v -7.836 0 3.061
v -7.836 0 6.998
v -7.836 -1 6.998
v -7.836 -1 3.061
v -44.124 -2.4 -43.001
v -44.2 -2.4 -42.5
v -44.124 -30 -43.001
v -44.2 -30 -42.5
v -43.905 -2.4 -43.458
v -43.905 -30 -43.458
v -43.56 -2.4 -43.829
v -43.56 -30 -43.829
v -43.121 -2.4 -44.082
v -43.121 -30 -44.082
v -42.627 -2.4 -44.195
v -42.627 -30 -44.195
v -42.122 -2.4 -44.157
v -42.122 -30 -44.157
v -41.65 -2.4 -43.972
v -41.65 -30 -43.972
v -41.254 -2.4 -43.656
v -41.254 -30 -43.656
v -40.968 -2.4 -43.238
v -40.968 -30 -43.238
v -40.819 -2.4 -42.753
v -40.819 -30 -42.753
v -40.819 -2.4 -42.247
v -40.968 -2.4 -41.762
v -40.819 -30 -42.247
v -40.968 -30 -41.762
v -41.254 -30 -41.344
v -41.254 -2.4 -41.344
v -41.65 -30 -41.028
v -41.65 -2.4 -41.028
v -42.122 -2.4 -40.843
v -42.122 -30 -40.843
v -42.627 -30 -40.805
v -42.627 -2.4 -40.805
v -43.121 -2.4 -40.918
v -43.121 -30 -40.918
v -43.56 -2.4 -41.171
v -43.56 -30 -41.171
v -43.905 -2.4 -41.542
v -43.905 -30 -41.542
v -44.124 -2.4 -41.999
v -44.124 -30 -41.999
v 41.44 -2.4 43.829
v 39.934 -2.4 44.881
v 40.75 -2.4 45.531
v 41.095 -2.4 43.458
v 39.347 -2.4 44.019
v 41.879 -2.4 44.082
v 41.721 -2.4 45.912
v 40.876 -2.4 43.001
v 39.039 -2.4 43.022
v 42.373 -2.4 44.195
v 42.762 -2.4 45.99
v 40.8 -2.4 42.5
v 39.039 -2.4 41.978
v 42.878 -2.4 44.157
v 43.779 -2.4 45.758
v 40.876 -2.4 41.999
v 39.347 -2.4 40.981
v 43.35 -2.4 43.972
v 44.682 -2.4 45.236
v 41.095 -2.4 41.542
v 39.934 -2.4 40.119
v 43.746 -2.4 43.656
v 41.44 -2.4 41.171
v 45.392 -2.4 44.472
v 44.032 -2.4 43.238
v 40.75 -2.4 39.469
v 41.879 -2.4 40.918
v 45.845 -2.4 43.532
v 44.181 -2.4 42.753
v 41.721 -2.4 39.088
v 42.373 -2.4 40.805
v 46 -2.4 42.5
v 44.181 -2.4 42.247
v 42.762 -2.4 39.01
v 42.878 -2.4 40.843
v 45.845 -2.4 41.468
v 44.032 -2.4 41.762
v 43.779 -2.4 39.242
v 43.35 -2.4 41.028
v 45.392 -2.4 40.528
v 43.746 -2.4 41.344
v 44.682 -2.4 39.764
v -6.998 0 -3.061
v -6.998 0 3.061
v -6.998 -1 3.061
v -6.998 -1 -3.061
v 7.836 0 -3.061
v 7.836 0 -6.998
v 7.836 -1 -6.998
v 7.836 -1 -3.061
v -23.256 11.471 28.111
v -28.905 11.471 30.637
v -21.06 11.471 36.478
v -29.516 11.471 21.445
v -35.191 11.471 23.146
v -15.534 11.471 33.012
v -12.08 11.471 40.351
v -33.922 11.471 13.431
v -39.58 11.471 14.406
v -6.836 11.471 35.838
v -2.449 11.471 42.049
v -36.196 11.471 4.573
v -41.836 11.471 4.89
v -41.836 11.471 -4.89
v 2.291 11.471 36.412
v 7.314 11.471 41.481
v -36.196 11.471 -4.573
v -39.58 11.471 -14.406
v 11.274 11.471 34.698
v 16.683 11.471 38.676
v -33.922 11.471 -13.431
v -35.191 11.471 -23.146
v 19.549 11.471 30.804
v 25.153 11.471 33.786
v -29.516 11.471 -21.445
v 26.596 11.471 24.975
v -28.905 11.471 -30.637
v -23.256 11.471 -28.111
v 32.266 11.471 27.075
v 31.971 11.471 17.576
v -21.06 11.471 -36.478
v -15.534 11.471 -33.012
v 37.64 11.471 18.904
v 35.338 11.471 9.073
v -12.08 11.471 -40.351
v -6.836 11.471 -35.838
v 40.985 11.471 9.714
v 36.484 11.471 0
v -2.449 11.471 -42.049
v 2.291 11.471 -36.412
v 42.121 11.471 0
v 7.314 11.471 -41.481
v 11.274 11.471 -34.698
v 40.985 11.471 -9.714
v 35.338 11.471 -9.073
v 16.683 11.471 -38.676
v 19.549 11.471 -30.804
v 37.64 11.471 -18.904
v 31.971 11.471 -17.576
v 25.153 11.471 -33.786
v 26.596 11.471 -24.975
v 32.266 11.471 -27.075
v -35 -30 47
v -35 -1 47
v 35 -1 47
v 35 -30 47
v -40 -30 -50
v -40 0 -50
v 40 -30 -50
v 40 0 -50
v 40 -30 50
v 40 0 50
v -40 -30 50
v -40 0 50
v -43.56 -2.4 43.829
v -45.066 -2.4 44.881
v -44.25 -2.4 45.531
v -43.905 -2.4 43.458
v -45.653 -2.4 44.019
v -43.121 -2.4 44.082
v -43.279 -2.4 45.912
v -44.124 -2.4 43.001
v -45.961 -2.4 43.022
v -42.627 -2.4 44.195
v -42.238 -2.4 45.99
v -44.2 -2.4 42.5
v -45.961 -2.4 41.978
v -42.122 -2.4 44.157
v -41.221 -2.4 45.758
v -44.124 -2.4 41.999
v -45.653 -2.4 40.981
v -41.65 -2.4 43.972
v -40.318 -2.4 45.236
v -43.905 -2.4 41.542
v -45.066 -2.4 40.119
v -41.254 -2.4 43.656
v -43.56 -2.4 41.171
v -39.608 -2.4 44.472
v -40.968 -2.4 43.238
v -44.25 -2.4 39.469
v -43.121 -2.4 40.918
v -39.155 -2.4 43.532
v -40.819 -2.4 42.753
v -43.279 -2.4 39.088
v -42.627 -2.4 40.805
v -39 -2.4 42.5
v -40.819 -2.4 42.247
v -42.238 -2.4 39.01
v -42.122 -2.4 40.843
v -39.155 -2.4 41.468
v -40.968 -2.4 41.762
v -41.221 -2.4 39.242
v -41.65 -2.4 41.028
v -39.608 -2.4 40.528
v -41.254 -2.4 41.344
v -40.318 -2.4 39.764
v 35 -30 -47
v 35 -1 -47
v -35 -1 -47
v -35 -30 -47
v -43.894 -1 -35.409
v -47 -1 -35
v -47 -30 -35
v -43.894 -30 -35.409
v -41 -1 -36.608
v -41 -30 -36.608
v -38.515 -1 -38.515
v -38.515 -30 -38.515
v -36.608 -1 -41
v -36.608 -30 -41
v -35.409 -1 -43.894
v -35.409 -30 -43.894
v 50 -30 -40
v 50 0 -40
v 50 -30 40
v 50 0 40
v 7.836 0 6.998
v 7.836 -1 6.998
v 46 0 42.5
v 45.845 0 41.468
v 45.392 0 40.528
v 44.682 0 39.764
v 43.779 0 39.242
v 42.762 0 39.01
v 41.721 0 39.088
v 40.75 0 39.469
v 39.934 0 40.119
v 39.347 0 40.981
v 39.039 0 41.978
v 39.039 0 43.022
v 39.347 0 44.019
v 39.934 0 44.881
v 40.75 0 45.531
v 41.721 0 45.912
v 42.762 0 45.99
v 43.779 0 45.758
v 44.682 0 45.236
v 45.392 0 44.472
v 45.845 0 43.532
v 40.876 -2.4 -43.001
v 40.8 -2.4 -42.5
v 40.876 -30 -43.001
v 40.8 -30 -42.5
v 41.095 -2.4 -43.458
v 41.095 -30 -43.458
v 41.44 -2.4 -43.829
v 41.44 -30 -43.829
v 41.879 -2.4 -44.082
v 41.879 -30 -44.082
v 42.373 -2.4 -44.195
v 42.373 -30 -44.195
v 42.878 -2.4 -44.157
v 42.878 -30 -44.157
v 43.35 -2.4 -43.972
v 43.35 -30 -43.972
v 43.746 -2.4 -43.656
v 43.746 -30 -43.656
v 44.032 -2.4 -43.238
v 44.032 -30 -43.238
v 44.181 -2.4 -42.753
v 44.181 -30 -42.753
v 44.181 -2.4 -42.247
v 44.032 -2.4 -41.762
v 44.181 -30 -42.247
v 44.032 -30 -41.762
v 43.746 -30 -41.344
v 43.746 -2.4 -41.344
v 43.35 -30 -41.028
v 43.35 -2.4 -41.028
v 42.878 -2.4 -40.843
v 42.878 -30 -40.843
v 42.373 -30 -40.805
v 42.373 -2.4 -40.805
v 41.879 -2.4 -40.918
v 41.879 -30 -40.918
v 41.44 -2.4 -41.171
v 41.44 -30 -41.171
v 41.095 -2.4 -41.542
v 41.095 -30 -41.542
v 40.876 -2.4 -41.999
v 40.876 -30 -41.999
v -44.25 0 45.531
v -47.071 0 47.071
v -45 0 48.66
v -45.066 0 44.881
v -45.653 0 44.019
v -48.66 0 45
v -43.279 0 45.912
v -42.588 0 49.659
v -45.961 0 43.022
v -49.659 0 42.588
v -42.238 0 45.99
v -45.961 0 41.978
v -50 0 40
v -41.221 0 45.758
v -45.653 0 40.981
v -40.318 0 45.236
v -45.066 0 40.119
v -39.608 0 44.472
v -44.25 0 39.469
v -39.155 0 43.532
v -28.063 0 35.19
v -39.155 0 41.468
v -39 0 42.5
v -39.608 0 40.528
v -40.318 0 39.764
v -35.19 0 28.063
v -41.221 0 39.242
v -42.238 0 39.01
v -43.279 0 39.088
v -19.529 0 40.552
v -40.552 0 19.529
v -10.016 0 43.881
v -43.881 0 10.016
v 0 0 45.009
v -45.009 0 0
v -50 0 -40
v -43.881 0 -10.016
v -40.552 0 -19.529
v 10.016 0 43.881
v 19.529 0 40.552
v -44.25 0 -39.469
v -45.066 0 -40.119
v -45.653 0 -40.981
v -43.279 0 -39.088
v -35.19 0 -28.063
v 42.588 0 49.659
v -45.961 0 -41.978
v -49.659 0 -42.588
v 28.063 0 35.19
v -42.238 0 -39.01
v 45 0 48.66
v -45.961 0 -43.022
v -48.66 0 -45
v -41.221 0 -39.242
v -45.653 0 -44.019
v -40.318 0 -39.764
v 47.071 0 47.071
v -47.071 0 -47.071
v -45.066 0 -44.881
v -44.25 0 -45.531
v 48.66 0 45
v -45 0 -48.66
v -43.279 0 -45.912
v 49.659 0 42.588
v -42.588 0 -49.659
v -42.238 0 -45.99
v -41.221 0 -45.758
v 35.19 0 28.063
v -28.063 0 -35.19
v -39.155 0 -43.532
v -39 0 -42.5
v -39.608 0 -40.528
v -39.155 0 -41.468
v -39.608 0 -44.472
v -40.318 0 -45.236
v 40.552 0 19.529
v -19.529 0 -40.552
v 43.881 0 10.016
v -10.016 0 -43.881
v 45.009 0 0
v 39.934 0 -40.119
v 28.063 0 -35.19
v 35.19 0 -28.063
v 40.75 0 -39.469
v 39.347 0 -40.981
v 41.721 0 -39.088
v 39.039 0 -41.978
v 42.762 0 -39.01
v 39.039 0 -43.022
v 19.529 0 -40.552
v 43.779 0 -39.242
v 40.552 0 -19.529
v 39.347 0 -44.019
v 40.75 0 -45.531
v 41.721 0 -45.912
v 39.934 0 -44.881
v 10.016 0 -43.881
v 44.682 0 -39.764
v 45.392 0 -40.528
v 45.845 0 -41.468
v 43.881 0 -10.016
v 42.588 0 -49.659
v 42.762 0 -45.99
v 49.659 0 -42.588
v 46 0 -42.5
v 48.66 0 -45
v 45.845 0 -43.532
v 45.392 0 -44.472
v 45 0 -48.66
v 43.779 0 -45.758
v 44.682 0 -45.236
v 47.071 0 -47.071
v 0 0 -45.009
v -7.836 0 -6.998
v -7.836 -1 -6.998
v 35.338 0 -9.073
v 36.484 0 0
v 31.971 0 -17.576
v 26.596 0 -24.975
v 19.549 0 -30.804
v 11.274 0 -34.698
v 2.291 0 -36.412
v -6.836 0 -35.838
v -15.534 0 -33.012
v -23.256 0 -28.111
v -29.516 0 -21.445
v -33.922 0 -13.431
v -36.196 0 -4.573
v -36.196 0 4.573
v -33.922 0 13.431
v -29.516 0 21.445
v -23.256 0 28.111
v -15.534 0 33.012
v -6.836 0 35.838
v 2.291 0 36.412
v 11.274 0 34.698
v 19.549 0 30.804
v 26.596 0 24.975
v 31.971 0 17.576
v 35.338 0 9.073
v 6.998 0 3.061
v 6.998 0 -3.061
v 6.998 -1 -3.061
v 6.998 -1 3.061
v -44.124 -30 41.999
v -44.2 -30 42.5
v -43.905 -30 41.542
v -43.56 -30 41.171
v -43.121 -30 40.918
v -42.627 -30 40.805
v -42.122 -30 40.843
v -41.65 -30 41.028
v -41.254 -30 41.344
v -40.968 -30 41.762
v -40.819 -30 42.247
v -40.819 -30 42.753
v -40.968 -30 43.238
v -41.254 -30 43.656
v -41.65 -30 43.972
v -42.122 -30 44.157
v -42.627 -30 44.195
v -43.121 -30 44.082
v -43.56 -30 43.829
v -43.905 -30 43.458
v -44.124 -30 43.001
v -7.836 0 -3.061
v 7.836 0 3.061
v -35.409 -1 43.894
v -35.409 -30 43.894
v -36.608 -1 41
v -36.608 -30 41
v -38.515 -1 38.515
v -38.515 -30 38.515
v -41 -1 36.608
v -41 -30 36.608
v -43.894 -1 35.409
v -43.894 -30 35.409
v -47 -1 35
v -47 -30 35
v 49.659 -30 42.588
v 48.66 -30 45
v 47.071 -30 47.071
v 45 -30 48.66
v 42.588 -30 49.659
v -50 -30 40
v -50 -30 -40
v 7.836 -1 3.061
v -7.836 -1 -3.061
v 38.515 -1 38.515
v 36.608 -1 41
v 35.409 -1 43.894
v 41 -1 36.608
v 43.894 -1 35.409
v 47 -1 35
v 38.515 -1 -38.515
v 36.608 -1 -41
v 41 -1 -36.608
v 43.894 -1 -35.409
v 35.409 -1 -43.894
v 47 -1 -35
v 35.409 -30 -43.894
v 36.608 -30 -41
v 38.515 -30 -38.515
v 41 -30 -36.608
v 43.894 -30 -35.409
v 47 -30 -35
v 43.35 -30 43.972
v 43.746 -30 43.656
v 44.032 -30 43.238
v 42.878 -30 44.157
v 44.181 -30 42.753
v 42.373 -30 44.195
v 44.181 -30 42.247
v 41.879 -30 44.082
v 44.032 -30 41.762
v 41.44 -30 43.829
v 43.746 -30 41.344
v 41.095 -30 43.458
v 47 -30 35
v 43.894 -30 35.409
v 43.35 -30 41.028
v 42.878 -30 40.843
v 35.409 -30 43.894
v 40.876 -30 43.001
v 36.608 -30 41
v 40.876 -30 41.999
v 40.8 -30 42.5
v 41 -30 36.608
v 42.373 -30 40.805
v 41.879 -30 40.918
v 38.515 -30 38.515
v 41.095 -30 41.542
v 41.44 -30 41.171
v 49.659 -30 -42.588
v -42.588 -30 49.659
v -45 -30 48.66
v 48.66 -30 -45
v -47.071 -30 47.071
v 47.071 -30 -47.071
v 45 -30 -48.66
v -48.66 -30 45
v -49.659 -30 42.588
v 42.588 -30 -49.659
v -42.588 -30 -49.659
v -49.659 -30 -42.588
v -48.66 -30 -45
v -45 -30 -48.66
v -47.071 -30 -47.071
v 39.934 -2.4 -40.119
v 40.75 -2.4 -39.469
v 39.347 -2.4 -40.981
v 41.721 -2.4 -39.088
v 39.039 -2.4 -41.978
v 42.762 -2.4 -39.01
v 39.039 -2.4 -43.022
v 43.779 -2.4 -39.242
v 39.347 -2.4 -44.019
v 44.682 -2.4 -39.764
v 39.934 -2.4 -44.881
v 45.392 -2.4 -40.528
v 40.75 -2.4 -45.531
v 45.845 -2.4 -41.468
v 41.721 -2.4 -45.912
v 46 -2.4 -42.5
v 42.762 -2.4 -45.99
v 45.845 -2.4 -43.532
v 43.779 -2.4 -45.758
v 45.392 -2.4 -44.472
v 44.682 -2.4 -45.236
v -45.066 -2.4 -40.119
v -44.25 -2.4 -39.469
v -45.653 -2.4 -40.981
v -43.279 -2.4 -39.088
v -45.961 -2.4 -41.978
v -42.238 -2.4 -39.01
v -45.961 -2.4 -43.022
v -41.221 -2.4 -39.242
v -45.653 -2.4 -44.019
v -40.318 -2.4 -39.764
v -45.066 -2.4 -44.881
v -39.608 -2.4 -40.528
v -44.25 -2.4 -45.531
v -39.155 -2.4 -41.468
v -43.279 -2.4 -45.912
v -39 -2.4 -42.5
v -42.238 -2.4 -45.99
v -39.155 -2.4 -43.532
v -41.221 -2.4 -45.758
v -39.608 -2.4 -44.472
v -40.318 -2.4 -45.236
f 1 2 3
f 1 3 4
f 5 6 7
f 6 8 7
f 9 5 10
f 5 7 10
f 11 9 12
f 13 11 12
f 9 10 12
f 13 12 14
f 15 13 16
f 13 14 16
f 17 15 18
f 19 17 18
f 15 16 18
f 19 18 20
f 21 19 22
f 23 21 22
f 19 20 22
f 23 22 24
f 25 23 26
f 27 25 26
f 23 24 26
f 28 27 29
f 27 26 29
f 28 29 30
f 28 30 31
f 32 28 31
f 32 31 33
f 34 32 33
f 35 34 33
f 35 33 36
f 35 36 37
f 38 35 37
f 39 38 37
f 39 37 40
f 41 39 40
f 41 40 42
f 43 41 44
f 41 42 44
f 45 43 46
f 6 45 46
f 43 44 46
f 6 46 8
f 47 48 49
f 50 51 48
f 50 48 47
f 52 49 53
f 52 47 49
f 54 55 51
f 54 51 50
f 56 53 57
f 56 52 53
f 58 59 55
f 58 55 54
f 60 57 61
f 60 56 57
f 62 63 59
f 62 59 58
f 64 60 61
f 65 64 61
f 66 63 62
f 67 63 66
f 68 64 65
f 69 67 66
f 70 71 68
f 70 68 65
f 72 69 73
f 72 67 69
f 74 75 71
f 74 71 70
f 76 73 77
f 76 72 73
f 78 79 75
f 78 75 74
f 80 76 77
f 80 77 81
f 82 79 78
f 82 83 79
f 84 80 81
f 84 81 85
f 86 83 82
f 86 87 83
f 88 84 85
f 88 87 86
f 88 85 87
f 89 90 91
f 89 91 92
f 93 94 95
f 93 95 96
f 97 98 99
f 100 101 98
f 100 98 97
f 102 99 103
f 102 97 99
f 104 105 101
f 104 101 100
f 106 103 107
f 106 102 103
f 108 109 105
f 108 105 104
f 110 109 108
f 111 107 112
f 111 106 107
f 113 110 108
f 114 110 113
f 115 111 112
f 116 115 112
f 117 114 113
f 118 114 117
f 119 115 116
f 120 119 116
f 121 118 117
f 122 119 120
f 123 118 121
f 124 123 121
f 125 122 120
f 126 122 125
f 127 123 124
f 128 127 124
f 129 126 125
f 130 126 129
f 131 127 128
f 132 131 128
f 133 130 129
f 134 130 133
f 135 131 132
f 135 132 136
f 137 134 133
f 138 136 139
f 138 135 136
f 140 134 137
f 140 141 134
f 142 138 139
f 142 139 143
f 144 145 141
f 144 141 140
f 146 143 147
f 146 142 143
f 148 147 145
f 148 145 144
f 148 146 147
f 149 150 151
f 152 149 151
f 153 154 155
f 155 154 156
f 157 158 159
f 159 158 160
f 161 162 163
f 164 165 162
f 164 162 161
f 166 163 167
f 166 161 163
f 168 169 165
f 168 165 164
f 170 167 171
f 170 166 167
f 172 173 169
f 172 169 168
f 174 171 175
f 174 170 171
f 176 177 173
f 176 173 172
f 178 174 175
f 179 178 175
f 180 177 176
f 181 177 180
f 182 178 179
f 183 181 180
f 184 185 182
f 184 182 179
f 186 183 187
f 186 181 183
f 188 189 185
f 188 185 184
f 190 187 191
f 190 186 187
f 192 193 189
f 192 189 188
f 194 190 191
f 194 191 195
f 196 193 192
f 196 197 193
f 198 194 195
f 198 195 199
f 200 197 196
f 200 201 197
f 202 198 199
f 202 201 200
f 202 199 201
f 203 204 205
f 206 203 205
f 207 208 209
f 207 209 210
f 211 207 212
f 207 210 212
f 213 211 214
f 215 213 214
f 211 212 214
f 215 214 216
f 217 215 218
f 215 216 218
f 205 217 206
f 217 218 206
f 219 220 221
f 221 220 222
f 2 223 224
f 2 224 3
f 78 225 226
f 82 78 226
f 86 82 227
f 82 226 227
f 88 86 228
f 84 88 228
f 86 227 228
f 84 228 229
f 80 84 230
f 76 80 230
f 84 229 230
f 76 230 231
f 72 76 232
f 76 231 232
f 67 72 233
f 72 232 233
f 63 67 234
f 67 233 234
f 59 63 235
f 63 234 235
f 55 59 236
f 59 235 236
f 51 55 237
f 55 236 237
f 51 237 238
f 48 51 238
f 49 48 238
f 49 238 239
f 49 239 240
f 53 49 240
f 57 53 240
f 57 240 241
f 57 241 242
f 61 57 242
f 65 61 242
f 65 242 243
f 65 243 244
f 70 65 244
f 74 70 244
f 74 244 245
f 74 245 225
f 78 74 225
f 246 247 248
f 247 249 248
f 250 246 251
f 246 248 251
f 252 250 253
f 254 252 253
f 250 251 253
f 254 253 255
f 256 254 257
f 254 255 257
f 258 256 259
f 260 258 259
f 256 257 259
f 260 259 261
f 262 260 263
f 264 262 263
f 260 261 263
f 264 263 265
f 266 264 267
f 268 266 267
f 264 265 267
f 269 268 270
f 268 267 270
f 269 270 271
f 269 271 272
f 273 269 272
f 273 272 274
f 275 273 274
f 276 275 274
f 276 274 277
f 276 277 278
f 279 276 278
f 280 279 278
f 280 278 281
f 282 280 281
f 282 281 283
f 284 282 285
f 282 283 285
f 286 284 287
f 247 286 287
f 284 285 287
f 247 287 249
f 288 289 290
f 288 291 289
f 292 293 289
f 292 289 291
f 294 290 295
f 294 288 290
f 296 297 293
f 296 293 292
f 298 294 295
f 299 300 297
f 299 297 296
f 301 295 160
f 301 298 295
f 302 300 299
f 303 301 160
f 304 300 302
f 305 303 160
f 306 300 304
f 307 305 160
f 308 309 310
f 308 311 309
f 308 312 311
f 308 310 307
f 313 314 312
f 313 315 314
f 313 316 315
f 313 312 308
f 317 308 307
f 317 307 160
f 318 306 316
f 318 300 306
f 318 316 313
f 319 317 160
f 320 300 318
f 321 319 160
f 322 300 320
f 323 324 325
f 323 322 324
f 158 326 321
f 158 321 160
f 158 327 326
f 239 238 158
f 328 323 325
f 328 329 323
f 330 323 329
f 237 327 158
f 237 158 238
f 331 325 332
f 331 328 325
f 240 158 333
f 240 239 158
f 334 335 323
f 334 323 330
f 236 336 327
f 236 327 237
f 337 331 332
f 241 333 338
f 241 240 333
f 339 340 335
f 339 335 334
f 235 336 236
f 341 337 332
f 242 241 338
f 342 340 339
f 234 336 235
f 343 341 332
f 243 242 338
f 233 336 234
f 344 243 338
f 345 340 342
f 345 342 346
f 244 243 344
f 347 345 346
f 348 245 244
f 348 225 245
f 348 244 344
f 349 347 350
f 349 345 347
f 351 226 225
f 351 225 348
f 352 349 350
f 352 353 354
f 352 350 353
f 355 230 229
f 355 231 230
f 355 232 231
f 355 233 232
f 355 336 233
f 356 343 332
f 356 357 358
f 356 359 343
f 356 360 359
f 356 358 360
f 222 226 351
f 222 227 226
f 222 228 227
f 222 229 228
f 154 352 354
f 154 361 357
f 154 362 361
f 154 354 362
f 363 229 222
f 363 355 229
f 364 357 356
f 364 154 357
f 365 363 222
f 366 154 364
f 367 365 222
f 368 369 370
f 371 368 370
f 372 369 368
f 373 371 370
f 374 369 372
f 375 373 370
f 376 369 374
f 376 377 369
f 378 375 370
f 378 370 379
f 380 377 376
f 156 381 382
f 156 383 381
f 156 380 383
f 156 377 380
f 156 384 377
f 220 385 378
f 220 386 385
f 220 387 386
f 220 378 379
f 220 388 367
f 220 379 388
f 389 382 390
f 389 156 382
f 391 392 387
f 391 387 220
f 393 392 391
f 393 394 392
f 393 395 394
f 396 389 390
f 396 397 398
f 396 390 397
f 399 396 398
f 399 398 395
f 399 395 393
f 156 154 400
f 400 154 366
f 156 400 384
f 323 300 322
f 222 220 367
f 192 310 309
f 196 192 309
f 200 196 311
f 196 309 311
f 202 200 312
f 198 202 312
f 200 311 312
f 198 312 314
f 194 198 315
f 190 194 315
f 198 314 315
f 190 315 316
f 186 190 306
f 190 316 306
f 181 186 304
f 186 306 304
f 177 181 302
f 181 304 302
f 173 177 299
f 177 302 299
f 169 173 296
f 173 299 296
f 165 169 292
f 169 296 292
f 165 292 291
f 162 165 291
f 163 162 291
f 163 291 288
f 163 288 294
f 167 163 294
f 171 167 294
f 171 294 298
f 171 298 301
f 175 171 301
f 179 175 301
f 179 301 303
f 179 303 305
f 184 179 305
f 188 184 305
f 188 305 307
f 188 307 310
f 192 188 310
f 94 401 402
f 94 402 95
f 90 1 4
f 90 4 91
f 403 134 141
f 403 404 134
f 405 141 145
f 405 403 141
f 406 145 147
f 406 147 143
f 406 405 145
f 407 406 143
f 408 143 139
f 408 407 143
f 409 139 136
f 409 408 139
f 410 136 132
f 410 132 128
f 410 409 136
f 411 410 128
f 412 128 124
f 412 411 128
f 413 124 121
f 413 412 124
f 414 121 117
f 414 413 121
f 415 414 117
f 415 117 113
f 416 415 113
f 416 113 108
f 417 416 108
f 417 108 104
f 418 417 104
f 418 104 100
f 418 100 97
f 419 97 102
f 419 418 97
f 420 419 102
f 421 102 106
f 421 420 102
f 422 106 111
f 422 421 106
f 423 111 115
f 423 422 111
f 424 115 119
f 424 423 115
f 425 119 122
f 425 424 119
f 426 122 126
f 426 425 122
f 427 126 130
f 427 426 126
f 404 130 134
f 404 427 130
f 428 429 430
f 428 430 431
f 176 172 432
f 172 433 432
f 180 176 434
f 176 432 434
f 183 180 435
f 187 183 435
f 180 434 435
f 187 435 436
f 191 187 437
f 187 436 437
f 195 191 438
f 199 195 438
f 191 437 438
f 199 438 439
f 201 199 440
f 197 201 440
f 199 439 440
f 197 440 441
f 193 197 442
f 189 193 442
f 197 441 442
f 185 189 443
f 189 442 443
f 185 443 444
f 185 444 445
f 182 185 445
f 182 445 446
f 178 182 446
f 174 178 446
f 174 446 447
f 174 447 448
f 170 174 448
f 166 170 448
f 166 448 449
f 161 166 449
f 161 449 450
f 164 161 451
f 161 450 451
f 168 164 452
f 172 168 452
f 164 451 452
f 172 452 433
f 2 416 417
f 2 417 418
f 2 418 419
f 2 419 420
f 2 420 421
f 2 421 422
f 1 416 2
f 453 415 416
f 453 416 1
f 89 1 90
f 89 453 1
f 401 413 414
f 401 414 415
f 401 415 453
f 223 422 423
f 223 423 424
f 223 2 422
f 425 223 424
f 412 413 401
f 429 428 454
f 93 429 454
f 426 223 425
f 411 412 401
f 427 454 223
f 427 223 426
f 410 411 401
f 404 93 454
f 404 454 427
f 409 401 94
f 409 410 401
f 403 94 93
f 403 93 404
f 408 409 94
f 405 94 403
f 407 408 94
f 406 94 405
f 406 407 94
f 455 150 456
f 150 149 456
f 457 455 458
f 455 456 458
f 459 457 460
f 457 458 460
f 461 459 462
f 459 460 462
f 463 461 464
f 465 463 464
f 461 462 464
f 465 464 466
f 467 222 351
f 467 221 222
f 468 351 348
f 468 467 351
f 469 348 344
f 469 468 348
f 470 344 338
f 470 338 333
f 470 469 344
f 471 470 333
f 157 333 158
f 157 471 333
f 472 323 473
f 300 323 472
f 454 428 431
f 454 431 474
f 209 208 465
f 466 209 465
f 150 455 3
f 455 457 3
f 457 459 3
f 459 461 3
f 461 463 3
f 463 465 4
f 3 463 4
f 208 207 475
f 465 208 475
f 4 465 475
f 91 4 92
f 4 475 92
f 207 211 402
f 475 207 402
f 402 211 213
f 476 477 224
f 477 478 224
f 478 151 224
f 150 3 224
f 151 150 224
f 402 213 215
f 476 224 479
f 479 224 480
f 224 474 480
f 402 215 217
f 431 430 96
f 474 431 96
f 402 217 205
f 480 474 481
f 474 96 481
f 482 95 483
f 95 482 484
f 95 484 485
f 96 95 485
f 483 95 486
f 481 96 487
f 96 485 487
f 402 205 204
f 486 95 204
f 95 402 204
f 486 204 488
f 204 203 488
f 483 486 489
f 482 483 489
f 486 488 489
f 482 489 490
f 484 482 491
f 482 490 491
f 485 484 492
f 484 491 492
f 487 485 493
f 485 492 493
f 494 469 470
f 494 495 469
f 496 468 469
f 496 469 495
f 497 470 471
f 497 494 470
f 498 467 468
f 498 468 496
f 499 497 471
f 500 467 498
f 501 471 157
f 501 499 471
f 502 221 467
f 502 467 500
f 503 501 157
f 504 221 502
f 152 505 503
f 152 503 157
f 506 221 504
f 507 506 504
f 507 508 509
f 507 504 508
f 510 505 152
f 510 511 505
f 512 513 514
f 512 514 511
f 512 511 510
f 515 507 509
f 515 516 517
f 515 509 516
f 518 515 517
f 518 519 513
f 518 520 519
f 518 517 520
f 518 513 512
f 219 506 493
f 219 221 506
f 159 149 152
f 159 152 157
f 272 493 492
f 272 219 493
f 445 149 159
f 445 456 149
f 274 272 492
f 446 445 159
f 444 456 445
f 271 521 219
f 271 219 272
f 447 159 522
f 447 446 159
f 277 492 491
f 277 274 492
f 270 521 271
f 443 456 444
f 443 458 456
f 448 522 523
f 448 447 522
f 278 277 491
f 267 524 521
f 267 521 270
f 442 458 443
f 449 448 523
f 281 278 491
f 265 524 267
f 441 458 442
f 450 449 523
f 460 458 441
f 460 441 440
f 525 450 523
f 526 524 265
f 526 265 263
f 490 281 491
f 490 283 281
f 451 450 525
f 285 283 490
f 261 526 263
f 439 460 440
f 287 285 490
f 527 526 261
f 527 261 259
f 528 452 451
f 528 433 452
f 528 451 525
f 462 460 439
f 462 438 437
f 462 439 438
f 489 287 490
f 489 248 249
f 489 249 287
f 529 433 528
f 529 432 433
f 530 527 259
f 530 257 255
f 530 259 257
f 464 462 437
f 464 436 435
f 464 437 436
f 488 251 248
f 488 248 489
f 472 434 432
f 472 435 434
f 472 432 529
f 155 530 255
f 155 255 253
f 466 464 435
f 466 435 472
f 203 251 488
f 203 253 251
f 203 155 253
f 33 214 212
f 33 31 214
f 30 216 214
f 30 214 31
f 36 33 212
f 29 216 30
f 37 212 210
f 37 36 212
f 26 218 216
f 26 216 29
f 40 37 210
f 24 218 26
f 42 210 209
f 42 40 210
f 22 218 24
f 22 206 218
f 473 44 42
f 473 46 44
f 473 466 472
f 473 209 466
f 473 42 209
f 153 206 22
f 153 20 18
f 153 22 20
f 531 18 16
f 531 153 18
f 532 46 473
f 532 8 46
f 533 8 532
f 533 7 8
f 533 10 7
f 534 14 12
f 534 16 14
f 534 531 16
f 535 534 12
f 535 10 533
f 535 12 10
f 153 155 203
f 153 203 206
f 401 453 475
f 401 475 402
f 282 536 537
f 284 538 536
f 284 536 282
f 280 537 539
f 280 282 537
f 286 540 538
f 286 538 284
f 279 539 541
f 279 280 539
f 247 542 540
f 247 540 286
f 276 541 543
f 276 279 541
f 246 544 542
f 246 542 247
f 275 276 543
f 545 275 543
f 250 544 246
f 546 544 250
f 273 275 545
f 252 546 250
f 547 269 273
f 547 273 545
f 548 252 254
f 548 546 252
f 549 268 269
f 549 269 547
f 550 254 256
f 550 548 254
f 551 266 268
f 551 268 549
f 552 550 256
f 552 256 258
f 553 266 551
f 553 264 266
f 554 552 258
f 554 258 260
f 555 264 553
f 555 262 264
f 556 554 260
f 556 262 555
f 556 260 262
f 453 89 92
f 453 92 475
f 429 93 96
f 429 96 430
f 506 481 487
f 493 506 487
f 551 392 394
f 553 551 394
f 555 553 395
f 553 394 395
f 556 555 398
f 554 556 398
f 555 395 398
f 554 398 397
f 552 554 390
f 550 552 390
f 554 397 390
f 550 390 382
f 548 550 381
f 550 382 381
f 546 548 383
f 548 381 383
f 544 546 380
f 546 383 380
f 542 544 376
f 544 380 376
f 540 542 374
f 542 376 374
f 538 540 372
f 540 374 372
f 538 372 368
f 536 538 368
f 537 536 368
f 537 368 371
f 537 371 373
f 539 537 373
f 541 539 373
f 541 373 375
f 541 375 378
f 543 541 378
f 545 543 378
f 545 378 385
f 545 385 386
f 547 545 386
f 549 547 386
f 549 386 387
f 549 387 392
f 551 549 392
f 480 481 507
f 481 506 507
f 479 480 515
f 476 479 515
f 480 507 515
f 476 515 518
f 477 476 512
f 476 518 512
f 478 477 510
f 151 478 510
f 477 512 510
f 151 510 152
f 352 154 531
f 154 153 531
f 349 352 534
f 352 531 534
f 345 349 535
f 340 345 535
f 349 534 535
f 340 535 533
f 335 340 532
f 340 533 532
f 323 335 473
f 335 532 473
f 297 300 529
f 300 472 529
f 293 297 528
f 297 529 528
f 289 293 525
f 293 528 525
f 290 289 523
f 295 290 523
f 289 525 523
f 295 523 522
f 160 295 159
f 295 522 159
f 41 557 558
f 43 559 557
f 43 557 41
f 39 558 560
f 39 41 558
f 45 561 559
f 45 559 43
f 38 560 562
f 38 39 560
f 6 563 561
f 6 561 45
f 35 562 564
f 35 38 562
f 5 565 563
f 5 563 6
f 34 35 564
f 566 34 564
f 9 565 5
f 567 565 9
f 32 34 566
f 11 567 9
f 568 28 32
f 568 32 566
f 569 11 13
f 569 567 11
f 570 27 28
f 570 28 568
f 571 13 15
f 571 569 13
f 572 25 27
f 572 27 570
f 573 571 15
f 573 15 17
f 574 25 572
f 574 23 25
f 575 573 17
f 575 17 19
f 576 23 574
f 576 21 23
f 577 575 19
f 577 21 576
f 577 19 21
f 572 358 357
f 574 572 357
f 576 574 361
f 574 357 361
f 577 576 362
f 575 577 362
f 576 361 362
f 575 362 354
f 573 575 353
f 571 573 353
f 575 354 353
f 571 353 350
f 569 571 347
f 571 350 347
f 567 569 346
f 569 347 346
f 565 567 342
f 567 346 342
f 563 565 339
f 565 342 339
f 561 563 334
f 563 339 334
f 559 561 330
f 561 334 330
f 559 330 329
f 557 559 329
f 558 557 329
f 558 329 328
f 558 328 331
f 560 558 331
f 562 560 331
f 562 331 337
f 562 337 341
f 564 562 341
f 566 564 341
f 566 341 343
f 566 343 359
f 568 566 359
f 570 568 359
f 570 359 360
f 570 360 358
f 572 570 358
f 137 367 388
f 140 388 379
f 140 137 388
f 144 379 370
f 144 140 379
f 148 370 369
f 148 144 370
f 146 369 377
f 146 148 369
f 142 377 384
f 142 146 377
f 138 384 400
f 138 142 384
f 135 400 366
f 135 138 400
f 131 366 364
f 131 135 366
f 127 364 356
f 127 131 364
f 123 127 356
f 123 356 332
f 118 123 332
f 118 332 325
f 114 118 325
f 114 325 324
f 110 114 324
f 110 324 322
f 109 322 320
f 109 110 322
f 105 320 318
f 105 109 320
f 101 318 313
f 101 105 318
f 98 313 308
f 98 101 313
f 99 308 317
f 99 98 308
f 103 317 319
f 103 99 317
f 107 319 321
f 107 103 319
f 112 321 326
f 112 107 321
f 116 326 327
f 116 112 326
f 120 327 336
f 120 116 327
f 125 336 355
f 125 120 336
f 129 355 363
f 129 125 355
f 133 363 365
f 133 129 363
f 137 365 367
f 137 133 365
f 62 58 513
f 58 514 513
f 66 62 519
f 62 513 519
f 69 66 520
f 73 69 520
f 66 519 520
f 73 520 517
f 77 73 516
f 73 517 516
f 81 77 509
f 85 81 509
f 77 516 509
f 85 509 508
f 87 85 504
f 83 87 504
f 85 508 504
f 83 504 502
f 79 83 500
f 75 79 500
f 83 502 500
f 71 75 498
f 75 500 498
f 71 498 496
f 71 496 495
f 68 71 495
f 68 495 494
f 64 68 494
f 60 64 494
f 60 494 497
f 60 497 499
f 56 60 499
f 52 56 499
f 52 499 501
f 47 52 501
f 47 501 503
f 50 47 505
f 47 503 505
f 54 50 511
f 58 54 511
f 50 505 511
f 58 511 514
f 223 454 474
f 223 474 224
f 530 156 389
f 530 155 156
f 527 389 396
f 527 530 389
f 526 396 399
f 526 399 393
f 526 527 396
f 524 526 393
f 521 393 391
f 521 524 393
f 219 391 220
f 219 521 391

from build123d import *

# Parameters (mm, degrees)
SKIZZE1_R                                            = 1.5
AUFSATZ_LINEAR_AUSTRAGEN1_DEPTH                      = 30
AUFSATZ_LINEAR_AUSTRAGEN2_DEPTH                      = 1
VERRUNDUNG1_R                                        = 10
VERRUNDUNG2_R                                        = 12
STIRNSENKUNG_F_R_M3_FLACHKOPFSCHRAUBE_MI_D           = 3.4
STIRNSENKUNG_F_R_M3_FLACHKOPFSCHRAUBE_MI_CBORE_D     = 7
STIRNSENKUNG_F_R_M3_FLACHKOPFSCHRAUBE_MI_CBORE_DEPTH = 2.4


with BuildPart() as part:
    # Skizze1 → Aufsatz-Linear austragen1 (new body)
    with BuildSketch(Plane(origin=(0, 0, 0), x_dir=(1, 0, 0), z_dir=(0, 1, 0))):
        Polygon((-50, 50), (50, 50), (50, -50), (-50, -50), (-50, 35), align=None)
        with Locations(Location((42.5, 42.5, 0), (0, 0, 270))):
            Circle(SKIZZE1_R, mode=Mode.SUBTRACT)
        with Locations(Location((-42.5, 42.5, 0), (0, 0, 270))):
            Circle(SKIZZE1_R, mode=Mode.SUBTRACT)
        with Locations(Location((42.5, -42.5, 0), (0, 0, 270))):
            Circle(SKIZZE1_R, mode=Mode.SUBTRACT)
        with Locations(Location((-42.5, -42.5, 0), (0, 0, 270))):
            Circle(SKIZZE1_R, mode=Mode.SUBTRACT)
        Polygon((-47, -35), (-35, -35), (-35, -47), (35, -47), (35, -35), (47, -35), (47, 35), (35, 35), (35, 47), (-35, 47), (-35, 35), (-47, 35), align=None, mode=Mode.SUBTRACT)
    extrude(amount=-AUFSATZ_LINEAR_AUSTRAGEN1_DEPTH)

    # Skizze1<3> → Aufsatz-Linear austragen2 (add)
    with BuildSketch(Plane(origin=(0, 0, 0), x_dir=(1, 0, 0), z_dir=(0, 1, 0))):
        Polygon((35, 47), (-35, 47), (-35, 35), (-47, 35), (-47, -35), (-35, -35), (-35, -47), (35, -47), (35, -35), (47, -35), (47, 35), (35, 35), align=None)
        Polygon((-7.8359, -3.0607), (-6.9977, -3.0607), (-6.9977, 3.0607), (-7.8359, 3.0607), (-7.8359, 6.9977), (-6.9977, 6.9977), (6.9977, 6.9977), (7.8359, 6.9977), (7.8359, 3.0607), (6.9977, 3.0607), (6.9977, -3.0607), (7.8359, -3.0607), (7.8359, -6.9977), (6.9977, -6.9977), (-6.9977, -6.9977), (-7.8359, -6.9977), align=None, mode=Mode.SUBTRACT)
    extrude(amount=-AUFSATZ_LINEAR_AUSTRAGEN2_DEPTH)

    # Verrundung1
    verrundung1_edges = [part.edges().sort_by_distance(p)[0] for p in [
        (50, -15, -50),
        (50, -15, 50),
        (-50, -15, 50),
        (-50, -15, -50),
    ]]
    fillet(verrundung1_edges, radius=VERRUNDUNG1_R)

    # Verrundung2
    verrundung2_edges = [part.edges().sort_by_distance(p)[0] for p in [
        (35, -15.5, 35),
        (-35, -15.5, 35),
        (35, -15.5, -35),
        (-35, -15.5, -35),
    ]]
    fillet(verrundung2_edges, radius=VERRUNDUNG2_R - 0.0001)  # a hair under: the kernel refuses the full size

    # Stirnsenkung für M3 Flachkopfschraube mit Schlitz1 (through all)
    with Locations(Plane(origin=(0, 0, 0), x_dir=(1, 0, 0), z_dir=(0, 1, 0))):
        with Locations((-42.5, -42.5), (-42.5, 42.5), (42.5, -42.5), (42.5, 42.5)):
            CounterBoreHole(STIRNSENKUNG_F_R_M3_FLACHKOPFSCHRAUBE_MI_D / 2, STIRNSENKUNG_F_R_M3_FLACHKOPFSCHRAUBE_MI_CBORE_D / 2, STIRNSENKUNG_F_R_M3_FLACHKOPFSCHRAUBE_MI_CBORE_DEPTH)

    # Skizze9 → Rotation1 (revolve)
    with BuildSketch(Plane.XY):
        Polygon((45.009357924, 0), (42.120640981, 11.470793218), (36.483893338, 11.470793218), (36.483893338, 0), align=None)
    revolve(axis=Axis((0, -1000, 0), (0, 1, 0)))


solid = part.part
